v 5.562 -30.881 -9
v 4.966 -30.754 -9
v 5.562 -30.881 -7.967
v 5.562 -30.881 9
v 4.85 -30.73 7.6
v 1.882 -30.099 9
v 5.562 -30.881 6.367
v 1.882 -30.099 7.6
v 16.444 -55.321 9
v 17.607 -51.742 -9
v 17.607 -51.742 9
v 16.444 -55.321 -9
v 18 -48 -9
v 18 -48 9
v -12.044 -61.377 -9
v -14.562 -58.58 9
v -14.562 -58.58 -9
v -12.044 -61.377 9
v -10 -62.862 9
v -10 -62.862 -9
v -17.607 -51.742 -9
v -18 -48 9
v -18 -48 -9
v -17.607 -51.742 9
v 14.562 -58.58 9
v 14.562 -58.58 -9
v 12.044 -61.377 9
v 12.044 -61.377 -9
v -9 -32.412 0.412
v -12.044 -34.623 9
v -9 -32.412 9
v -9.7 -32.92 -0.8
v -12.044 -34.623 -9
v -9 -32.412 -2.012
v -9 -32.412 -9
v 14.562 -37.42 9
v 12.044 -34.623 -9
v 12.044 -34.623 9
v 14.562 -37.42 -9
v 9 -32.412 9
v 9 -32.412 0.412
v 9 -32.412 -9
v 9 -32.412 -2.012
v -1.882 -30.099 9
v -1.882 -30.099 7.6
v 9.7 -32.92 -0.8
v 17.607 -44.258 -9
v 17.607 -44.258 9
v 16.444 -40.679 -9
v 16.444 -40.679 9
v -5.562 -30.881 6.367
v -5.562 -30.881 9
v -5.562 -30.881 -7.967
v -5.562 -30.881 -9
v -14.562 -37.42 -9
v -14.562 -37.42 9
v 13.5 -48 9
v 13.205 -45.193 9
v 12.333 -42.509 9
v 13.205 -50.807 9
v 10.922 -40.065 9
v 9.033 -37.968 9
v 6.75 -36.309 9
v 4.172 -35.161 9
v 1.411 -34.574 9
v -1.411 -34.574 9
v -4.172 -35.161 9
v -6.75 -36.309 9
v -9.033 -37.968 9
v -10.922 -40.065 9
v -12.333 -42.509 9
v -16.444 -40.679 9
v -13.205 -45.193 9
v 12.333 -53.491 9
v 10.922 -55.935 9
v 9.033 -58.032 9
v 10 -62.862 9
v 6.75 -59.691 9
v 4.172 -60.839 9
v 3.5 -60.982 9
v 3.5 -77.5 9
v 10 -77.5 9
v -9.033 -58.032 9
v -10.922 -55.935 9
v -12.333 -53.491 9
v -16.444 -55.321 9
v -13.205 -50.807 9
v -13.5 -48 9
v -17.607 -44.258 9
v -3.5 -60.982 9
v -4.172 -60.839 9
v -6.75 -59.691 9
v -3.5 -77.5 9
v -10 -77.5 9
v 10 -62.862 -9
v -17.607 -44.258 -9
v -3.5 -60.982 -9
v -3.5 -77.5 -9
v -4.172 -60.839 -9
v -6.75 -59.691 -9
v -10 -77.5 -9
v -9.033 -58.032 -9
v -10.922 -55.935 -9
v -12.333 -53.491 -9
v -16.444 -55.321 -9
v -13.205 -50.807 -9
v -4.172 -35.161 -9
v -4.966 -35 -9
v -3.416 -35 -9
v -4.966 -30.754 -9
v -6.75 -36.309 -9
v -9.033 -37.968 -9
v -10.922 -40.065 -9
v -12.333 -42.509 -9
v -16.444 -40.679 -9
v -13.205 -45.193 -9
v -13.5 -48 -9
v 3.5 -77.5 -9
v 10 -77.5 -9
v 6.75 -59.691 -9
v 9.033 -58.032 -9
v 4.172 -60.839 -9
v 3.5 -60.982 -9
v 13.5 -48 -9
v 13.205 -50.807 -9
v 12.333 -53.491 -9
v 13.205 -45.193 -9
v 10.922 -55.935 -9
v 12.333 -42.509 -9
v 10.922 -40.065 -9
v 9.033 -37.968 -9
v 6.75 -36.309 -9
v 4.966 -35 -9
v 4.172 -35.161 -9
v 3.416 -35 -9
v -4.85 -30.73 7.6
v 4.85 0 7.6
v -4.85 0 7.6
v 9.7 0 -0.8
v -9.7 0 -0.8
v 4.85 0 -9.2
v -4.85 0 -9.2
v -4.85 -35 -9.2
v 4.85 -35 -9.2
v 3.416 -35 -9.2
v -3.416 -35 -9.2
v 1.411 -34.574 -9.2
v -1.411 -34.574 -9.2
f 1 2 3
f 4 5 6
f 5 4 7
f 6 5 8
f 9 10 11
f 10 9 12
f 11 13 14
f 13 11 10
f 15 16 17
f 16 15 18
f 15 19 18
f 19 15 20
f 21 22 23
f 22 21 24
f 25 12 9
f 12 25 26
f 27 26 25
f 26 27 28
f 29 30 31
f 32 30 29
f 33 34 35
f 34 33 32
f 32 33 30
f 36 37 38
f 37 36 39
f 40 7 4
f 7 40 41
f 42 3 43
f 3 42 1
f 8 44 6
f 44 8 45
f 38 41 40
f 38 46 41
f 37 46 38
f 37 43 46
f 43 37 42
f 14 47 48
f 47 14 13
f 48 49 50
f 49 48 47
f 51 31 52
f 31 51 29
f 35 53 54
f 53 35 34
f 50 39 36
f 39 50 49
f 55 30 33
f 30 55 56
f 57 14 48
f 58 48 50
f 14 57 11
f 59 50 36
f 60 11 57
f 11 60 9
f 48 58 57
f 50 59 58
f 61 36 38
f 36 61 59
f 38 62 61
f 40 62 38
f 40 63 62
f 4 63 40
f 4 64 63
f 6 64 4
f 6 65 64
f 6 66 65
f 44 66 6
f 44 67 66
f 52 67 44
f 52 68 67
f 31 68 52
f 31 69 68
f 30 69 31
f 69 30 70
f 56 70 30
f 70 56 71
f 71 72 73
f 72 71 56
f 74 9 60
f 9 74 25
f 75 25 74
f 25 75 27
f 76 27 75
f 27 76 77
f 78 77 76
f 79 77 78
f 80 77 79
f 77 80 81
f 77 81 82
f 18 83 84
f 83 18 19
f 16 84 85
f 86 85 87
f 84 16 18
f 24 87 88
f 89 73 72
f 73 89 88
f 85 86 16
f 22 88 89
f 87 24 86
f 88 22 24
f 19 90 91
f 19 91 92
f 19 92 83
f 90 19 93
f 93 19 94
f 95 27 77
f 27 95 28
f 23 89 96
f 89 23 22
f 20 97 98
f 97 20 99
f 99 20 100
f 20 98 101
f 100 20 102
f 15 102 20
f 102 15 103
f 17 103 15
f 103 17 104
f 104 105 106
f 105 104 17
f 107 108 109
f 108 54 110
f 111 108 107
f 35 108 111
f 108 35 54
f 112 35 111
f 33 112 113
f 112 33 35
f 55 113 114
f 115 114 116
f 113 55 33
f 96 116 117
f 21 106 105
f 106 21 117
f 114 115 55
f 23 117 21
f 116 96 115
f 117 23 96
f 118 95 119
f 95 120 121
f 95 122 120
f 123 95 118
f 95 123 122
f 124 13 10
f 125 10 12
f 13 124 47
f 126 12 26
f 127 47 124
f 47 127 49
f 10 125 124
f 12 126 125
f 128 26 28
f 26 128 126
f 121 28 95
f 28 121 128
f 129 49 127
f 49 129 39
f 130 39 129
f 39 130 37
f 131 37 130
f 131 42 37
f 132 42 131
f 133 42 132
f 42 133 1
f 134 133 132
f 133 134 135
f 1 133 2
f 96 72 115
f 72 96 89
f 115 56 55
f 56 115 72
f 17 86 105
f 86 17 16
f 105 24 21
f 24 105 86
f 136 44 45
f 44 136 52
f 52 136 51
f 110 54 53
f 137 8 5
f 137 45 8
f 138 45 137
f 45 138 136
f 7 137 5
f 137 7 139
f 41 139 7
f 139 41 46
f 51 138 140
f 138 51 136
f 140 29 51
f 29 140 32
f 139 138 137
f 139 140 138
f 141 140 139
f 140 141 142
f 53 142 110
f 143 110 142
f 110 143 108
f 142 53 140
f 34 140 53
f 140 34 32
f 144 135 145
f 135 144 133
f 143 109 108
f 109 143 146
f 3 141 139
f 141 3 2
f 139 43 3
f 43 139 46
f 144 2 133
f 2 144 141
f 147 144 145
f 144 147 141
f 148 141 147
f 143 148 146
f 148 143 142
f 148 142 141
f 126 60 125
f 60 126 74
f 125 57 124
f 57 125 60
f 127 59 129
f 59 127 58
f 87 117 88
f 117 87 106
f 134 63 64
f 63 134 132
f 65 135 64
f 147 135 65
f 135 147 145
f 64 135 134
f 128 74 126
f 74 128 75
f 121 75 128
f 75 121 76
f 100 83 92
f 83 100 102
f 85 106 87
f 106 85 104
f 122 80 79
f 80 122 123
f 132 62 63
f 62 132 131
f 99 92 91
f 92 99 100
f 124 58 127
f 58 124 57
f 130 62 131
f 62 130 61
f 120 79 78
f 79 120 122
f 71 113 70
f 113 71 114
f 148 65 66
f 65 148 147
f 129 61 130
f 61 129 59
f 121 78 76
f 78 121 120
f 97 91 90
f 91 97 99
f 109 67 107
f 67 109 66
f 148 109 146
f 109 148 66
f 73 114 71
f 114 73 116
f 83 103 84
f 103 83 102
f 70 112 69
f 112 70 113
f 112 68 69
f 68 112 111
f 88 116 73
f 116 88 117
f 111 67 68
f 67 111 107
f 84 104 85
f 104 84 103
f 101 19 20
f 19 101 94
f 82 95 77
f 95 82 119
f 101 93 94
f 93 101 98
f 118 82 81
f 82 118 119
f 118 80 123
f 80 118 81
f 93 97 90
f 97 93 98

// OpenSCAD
rotate([90, 0, 0]){
difference() 
{ 
// ode�et distan�n� mezery


union() 
{
// p�i�ten� patic pro sta�en�

difference() 
{ 
// diffference pro  otvor pro osazen� na ty�



union() 
{
// union pro v�lec napojen� na cylinder pro zasazen� do rukojeti

union() 
// union pro p�ipojen� cylinderu na v�lec
{


//cylinder(h = 14, r1 = 17, r2 = 10, center = true); 
//cylinder-nepouzite skoseni napojeni tyce pro usazeni v rukojeti

//zakladn�
#translate([0,9,48]) rotate ([90,0,0])cylinder(h = 18, r=18);
// 40 je nastavena vnitrni prumer na 35 a vnejsi na 40
        
} 
translate([0,-0.8,0]) rotate ([0,0,0]) cylinder(h=35, r=9.7,$fn=6); 
// umisteni ctverce pro dosazeni do rukojeti
//tloustka operky je 4mm + 14mm pro zesileni
//19 je posun nahoru a dolu/////35 vyska propojky
}
translate([0,10,48]) rotate ([90,0,0])cylinder(h = 20, r=13.5);
// odecitaci valec pro otvor na osazen� ty�e

//27 je vnitrni prumer

}
translate([0,0,70]) rotate ([90,0,0]) cube(size = [20,15,18], center = true);
//sloupky pro utazeni
}
translate([0,10,80]) rotate ([0,0,0])cube(size = [7,50,40], center = true);
//odecet distancni mezery
}        


//# pro zviditeleneni
//priblizeni shift+prav tlacitko mysi+ pousouvani dopredu/dozadu
}
